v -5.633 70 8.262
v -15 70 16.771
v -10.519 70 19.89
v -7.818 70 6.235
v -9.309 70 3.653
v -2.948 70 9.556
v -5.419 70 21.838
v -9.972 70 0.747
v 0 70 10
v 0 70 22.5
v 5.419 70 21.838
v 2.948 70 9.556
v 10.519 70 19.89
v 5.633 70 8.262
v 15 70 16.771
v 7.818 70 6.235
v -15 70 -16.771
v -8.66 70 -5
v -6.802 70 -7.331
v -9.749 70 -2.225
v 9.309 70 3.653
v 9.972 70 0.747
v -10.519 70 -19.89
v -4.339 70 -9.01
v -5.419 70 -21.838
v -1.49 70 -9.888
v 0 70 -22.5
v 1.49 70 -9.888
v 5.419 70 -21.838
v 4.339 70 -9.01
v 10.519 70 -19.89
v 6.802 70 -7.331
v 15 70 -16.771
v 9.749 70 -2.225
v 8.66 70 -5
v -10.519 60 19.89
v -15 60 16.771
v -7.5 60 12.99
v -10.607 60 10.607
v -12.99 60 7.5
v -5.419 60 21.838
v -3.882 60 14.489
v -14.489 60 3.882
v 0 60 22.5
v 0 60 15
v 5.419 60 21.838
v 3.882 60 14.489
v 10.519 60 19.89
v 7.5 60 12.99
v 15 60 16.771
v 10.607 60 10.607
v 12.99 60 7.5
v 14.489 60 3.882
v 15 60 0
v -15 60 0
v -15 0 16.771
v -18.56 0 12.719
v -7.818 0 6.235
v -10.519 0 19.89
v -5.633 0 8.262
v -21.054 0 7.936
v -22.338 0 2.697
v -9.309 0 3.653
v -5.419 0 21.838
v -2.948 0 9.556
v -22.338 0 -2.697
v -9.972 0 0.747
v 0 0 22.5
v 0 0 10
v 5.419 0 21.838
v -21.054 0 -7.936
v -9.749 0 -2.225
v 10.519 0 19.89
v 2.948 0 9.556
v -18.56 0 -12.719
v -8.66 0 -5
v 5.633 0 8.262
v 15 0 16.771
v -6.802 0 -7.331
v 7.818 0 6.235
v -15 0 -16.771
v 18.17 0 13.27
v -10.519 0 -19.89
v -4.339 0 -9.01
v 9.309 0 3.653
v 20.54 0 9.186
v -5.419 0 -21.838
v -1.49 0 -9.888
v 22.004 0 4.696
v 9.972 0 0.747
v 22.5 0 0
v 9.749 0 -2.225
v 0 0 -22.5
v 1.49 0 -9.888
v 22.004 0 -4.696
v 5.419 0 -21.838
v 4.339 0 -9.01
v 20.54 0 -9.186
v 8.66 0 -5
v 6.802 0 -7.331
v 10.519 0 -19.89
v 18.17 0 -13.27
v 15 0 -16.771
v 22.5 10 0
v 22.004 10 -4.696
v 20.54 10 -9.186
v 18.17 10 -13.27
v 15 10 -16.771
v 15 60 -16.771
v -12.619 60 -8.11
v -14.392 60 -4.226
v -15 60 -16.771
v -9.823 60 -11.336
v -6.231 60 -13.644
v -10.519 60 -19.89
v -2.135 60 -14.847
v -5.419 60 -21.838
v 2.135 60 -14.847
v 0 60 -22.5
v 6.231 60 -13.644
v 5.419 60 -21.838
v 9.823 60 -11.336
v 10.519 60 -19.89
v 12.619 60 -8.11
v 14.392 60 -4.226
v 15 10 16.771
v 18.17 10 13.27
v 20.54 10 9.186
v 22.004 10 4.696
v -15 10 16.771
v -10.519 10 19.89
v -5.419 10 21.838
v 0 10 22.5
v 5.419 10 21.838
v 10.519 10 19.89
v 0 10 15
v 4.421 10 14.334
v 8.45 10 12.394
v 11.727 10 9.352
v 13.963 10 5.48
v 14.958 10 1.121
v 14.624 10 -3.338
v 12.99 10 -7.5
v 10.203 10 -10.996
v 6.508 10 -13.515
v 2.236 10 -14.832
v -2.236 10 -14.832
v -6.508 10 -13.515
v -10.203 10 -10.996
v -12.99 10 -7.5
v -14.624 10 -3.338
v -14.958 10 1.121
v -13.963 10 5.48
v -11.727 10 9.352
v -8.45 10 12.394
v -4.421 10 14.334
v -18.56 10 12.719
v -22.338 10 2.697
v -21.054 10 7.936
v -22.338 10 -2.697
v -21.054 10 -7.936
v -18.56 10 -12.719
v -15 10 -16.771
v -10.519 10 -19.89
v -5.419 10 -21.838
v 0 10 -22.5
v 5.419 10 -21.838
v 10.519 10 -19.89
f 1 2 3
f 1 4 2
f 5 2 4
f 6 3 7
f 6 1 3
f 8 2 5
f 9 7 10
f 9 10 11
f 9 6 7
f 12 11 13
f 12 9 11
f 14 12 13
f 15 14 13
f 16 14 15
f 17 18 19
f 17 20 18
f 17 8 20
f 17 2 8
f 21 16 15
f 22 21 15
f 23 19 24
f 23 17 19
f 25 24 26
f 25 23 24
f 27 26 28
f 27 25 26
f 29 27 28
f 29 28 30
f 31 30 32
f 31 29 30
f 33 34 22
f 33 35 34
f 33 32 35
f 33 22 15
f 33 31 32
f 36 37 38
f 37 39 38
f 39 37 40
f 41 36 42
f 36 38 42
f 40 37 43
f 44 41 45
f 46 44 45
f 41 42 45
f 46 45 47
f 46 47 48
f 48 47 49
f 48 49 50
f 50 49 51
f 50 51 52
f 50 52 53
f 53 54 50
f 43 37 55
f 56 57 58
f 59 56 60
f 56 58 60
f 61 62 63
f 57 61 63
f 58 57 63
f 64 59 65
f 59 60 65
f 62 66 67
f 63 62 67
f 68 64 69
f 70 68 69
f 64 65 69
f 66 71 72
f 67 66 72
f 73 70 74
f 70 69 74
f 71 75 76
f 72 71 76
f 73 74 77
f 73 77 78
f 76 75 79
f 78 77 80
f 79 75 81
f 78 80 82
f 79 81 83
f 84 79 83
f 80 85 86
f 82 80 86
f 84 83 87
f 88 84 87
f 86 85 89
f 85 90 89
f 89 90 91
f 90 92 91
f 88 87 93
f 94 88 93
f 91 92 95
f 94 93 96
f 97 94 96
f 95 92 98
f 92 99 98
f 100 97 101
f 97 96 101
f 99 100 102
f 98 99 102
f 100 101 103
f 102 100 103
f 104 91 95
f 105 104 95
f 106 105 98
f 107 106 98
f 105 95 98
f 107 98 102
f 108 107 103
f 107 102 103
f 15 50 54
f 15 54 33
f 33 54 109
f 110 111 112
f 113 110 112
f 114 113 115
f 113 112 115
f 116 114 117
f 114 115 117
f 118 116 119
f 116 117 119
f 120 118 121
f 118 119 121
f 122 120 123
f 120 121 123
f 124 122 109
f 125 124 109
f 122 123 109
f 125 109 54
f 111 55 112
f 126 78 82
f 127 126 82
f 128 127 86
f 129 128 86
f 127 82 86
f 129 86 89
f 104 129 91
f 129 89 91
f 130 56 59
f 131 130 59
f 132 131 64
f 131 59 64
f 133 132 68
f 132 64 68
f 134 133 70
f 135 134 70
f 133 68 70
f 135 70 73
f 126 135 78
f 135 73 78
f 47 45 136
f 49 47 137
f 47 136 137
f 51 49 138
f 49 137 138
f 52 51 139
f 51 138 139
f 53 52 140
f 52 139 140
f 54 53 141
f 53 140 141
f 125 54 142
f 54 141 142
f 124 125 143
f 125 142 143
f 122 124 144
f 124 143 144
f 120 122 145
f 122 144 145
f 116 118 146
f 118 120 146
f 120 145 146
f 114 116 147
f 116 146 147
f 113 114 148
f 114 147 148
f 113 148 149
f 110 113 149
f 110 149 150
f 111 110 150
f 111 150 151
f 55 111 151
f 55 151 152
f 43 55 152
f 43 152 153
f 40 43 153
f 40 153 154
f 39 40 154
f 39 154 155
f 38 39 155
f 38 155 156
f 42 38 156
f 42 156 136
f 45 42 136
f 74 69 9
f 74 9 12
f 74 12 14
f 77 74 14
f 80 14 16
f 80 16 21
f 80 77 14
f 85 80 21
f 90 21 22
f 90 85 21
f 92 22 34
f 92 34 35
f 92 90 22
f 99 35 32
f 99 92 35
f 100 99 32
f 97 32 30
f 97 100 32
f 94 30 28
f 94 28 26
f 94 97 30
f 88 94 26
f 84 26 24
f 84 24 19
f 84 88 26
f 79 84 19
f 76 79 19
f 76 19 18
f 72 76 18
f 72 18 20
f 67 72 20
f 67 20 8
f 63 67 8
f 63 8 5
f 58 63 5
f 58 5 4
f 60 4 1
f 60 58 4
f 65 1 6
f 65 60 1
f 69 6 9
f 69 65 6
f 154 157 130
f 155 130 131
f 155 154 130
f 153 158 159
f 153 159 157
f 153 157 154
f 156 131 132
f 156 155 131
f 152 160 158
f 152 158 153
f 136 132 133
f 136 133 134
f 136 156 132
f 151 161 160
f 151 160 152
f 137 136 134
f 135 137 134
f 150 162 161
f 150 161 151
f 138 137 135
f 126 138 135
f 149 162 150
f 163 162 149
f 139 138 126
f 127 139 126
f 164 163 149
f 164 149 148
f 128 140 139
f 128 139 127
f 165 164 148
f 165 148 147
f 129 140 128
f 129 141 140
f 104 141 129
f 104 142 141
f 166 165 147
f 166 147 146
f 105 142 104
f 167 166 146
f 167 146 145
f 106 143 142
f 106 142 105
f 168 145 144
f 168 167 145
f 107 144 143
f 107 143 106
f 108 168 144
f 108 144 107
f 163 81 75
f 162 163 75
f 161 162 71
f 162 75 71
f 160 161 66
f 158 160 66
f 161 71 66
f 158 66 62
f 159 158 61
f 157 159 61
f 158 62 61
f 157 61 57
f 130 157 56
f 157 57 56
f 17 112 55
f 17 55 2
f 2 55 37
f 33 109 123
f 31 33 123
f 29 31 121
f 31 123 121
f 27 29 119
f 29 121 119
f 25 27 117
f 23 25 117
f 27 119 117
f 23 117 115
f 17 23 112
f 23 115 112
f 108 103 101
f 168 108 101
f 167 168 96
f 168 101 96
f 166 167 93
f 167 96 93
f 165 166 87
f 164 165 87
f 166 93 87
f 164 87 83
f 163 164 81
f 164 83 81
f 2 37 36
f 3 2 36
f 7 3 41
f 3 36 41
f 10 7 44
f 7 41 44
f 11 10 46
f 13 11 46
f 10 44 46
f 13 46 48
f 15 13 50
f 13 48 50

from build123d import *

# Parameters (mm, degrees)
SKETCH1_R           = 22.5
SKETCH1_R_2         = 15
BOSS_EXTRUDE1_DEPTH = 10
SKETCH1_3_R         = 10
BOSS_EXTRUDE2_DEPTH = 70
BOSS_EXTRUDE3_START = 60
BOSS_EXTRUDE3_DEPTH = 10


with BuildPart() as part:
    # Sketch1 → Boss-Extrude1 (new body)
    with BuildSketch(Plane(origin=(0, 0, 0), x_dir=(1, 0, 0), z_dir=(0, 1, 0))):
        Circle(SKETCH1_R)
        Circle(SKETCH1_R_2, mode=Mode.SUBTRACT)
    extrude(amount=BOSS_EXTRUDE1_DEPTH)

    # Sketch1<3> → Boss-Extrude2 (add)
    with BuildSketch(Plane(origin=(0, 0, 0), x_dir=(1, 0, 0), z_dir=(0, 1, 0))):
        with BuildLine():
            ThreePointArc((-15, 1.4e-08), (-7e-09, -15), (15, 0))
            ThreePointArc((15, 0), (7e-09, 15), (-15, 1.4e-08))
        make_face()
        Circle(SKETCH1_3_R, mode=Mode.SUBTRACT)
    extrude(amount=BOSS_EXTRUDE2_DEPTH)

    # Sketch1<4> → Boss-Extrude3 (add)
    with BuildSketch(Plane(origin=(0, 0, 0), x_dir=(1, 0, 0), z_dir=(0, 1, 0)).offset(BOSS_EXTRUDE3_START)):
        with BuildLine():
            ThreePointArc((-15, -16.770509831), (0, -22.5), (15, -16.770509831))
            Line((15, -16.770509831), (15, 0))
            ThreePointArc((15, 0), (-7e-09, -15), (-15, 1.4e-08))
            Line((-15, 1.4e-08), (-15, -16.770509831))
        make_face()
        with BuildLine():
            ThreePointArc((-15, 1.4e-08), (7e-09, 15), (15, 0))
            Line((15, 0), (15, 16.770509831))
            ThreePointArc((15, 16.770509831), (0, 22.5), (-15, 16.770509831))
            Line((-15, 16.770509831), (-15, 1.4e-08))
        make_face()
    extrude(amount=BOSS_EXTRUDE3_DEPTH)


solid = part.part
